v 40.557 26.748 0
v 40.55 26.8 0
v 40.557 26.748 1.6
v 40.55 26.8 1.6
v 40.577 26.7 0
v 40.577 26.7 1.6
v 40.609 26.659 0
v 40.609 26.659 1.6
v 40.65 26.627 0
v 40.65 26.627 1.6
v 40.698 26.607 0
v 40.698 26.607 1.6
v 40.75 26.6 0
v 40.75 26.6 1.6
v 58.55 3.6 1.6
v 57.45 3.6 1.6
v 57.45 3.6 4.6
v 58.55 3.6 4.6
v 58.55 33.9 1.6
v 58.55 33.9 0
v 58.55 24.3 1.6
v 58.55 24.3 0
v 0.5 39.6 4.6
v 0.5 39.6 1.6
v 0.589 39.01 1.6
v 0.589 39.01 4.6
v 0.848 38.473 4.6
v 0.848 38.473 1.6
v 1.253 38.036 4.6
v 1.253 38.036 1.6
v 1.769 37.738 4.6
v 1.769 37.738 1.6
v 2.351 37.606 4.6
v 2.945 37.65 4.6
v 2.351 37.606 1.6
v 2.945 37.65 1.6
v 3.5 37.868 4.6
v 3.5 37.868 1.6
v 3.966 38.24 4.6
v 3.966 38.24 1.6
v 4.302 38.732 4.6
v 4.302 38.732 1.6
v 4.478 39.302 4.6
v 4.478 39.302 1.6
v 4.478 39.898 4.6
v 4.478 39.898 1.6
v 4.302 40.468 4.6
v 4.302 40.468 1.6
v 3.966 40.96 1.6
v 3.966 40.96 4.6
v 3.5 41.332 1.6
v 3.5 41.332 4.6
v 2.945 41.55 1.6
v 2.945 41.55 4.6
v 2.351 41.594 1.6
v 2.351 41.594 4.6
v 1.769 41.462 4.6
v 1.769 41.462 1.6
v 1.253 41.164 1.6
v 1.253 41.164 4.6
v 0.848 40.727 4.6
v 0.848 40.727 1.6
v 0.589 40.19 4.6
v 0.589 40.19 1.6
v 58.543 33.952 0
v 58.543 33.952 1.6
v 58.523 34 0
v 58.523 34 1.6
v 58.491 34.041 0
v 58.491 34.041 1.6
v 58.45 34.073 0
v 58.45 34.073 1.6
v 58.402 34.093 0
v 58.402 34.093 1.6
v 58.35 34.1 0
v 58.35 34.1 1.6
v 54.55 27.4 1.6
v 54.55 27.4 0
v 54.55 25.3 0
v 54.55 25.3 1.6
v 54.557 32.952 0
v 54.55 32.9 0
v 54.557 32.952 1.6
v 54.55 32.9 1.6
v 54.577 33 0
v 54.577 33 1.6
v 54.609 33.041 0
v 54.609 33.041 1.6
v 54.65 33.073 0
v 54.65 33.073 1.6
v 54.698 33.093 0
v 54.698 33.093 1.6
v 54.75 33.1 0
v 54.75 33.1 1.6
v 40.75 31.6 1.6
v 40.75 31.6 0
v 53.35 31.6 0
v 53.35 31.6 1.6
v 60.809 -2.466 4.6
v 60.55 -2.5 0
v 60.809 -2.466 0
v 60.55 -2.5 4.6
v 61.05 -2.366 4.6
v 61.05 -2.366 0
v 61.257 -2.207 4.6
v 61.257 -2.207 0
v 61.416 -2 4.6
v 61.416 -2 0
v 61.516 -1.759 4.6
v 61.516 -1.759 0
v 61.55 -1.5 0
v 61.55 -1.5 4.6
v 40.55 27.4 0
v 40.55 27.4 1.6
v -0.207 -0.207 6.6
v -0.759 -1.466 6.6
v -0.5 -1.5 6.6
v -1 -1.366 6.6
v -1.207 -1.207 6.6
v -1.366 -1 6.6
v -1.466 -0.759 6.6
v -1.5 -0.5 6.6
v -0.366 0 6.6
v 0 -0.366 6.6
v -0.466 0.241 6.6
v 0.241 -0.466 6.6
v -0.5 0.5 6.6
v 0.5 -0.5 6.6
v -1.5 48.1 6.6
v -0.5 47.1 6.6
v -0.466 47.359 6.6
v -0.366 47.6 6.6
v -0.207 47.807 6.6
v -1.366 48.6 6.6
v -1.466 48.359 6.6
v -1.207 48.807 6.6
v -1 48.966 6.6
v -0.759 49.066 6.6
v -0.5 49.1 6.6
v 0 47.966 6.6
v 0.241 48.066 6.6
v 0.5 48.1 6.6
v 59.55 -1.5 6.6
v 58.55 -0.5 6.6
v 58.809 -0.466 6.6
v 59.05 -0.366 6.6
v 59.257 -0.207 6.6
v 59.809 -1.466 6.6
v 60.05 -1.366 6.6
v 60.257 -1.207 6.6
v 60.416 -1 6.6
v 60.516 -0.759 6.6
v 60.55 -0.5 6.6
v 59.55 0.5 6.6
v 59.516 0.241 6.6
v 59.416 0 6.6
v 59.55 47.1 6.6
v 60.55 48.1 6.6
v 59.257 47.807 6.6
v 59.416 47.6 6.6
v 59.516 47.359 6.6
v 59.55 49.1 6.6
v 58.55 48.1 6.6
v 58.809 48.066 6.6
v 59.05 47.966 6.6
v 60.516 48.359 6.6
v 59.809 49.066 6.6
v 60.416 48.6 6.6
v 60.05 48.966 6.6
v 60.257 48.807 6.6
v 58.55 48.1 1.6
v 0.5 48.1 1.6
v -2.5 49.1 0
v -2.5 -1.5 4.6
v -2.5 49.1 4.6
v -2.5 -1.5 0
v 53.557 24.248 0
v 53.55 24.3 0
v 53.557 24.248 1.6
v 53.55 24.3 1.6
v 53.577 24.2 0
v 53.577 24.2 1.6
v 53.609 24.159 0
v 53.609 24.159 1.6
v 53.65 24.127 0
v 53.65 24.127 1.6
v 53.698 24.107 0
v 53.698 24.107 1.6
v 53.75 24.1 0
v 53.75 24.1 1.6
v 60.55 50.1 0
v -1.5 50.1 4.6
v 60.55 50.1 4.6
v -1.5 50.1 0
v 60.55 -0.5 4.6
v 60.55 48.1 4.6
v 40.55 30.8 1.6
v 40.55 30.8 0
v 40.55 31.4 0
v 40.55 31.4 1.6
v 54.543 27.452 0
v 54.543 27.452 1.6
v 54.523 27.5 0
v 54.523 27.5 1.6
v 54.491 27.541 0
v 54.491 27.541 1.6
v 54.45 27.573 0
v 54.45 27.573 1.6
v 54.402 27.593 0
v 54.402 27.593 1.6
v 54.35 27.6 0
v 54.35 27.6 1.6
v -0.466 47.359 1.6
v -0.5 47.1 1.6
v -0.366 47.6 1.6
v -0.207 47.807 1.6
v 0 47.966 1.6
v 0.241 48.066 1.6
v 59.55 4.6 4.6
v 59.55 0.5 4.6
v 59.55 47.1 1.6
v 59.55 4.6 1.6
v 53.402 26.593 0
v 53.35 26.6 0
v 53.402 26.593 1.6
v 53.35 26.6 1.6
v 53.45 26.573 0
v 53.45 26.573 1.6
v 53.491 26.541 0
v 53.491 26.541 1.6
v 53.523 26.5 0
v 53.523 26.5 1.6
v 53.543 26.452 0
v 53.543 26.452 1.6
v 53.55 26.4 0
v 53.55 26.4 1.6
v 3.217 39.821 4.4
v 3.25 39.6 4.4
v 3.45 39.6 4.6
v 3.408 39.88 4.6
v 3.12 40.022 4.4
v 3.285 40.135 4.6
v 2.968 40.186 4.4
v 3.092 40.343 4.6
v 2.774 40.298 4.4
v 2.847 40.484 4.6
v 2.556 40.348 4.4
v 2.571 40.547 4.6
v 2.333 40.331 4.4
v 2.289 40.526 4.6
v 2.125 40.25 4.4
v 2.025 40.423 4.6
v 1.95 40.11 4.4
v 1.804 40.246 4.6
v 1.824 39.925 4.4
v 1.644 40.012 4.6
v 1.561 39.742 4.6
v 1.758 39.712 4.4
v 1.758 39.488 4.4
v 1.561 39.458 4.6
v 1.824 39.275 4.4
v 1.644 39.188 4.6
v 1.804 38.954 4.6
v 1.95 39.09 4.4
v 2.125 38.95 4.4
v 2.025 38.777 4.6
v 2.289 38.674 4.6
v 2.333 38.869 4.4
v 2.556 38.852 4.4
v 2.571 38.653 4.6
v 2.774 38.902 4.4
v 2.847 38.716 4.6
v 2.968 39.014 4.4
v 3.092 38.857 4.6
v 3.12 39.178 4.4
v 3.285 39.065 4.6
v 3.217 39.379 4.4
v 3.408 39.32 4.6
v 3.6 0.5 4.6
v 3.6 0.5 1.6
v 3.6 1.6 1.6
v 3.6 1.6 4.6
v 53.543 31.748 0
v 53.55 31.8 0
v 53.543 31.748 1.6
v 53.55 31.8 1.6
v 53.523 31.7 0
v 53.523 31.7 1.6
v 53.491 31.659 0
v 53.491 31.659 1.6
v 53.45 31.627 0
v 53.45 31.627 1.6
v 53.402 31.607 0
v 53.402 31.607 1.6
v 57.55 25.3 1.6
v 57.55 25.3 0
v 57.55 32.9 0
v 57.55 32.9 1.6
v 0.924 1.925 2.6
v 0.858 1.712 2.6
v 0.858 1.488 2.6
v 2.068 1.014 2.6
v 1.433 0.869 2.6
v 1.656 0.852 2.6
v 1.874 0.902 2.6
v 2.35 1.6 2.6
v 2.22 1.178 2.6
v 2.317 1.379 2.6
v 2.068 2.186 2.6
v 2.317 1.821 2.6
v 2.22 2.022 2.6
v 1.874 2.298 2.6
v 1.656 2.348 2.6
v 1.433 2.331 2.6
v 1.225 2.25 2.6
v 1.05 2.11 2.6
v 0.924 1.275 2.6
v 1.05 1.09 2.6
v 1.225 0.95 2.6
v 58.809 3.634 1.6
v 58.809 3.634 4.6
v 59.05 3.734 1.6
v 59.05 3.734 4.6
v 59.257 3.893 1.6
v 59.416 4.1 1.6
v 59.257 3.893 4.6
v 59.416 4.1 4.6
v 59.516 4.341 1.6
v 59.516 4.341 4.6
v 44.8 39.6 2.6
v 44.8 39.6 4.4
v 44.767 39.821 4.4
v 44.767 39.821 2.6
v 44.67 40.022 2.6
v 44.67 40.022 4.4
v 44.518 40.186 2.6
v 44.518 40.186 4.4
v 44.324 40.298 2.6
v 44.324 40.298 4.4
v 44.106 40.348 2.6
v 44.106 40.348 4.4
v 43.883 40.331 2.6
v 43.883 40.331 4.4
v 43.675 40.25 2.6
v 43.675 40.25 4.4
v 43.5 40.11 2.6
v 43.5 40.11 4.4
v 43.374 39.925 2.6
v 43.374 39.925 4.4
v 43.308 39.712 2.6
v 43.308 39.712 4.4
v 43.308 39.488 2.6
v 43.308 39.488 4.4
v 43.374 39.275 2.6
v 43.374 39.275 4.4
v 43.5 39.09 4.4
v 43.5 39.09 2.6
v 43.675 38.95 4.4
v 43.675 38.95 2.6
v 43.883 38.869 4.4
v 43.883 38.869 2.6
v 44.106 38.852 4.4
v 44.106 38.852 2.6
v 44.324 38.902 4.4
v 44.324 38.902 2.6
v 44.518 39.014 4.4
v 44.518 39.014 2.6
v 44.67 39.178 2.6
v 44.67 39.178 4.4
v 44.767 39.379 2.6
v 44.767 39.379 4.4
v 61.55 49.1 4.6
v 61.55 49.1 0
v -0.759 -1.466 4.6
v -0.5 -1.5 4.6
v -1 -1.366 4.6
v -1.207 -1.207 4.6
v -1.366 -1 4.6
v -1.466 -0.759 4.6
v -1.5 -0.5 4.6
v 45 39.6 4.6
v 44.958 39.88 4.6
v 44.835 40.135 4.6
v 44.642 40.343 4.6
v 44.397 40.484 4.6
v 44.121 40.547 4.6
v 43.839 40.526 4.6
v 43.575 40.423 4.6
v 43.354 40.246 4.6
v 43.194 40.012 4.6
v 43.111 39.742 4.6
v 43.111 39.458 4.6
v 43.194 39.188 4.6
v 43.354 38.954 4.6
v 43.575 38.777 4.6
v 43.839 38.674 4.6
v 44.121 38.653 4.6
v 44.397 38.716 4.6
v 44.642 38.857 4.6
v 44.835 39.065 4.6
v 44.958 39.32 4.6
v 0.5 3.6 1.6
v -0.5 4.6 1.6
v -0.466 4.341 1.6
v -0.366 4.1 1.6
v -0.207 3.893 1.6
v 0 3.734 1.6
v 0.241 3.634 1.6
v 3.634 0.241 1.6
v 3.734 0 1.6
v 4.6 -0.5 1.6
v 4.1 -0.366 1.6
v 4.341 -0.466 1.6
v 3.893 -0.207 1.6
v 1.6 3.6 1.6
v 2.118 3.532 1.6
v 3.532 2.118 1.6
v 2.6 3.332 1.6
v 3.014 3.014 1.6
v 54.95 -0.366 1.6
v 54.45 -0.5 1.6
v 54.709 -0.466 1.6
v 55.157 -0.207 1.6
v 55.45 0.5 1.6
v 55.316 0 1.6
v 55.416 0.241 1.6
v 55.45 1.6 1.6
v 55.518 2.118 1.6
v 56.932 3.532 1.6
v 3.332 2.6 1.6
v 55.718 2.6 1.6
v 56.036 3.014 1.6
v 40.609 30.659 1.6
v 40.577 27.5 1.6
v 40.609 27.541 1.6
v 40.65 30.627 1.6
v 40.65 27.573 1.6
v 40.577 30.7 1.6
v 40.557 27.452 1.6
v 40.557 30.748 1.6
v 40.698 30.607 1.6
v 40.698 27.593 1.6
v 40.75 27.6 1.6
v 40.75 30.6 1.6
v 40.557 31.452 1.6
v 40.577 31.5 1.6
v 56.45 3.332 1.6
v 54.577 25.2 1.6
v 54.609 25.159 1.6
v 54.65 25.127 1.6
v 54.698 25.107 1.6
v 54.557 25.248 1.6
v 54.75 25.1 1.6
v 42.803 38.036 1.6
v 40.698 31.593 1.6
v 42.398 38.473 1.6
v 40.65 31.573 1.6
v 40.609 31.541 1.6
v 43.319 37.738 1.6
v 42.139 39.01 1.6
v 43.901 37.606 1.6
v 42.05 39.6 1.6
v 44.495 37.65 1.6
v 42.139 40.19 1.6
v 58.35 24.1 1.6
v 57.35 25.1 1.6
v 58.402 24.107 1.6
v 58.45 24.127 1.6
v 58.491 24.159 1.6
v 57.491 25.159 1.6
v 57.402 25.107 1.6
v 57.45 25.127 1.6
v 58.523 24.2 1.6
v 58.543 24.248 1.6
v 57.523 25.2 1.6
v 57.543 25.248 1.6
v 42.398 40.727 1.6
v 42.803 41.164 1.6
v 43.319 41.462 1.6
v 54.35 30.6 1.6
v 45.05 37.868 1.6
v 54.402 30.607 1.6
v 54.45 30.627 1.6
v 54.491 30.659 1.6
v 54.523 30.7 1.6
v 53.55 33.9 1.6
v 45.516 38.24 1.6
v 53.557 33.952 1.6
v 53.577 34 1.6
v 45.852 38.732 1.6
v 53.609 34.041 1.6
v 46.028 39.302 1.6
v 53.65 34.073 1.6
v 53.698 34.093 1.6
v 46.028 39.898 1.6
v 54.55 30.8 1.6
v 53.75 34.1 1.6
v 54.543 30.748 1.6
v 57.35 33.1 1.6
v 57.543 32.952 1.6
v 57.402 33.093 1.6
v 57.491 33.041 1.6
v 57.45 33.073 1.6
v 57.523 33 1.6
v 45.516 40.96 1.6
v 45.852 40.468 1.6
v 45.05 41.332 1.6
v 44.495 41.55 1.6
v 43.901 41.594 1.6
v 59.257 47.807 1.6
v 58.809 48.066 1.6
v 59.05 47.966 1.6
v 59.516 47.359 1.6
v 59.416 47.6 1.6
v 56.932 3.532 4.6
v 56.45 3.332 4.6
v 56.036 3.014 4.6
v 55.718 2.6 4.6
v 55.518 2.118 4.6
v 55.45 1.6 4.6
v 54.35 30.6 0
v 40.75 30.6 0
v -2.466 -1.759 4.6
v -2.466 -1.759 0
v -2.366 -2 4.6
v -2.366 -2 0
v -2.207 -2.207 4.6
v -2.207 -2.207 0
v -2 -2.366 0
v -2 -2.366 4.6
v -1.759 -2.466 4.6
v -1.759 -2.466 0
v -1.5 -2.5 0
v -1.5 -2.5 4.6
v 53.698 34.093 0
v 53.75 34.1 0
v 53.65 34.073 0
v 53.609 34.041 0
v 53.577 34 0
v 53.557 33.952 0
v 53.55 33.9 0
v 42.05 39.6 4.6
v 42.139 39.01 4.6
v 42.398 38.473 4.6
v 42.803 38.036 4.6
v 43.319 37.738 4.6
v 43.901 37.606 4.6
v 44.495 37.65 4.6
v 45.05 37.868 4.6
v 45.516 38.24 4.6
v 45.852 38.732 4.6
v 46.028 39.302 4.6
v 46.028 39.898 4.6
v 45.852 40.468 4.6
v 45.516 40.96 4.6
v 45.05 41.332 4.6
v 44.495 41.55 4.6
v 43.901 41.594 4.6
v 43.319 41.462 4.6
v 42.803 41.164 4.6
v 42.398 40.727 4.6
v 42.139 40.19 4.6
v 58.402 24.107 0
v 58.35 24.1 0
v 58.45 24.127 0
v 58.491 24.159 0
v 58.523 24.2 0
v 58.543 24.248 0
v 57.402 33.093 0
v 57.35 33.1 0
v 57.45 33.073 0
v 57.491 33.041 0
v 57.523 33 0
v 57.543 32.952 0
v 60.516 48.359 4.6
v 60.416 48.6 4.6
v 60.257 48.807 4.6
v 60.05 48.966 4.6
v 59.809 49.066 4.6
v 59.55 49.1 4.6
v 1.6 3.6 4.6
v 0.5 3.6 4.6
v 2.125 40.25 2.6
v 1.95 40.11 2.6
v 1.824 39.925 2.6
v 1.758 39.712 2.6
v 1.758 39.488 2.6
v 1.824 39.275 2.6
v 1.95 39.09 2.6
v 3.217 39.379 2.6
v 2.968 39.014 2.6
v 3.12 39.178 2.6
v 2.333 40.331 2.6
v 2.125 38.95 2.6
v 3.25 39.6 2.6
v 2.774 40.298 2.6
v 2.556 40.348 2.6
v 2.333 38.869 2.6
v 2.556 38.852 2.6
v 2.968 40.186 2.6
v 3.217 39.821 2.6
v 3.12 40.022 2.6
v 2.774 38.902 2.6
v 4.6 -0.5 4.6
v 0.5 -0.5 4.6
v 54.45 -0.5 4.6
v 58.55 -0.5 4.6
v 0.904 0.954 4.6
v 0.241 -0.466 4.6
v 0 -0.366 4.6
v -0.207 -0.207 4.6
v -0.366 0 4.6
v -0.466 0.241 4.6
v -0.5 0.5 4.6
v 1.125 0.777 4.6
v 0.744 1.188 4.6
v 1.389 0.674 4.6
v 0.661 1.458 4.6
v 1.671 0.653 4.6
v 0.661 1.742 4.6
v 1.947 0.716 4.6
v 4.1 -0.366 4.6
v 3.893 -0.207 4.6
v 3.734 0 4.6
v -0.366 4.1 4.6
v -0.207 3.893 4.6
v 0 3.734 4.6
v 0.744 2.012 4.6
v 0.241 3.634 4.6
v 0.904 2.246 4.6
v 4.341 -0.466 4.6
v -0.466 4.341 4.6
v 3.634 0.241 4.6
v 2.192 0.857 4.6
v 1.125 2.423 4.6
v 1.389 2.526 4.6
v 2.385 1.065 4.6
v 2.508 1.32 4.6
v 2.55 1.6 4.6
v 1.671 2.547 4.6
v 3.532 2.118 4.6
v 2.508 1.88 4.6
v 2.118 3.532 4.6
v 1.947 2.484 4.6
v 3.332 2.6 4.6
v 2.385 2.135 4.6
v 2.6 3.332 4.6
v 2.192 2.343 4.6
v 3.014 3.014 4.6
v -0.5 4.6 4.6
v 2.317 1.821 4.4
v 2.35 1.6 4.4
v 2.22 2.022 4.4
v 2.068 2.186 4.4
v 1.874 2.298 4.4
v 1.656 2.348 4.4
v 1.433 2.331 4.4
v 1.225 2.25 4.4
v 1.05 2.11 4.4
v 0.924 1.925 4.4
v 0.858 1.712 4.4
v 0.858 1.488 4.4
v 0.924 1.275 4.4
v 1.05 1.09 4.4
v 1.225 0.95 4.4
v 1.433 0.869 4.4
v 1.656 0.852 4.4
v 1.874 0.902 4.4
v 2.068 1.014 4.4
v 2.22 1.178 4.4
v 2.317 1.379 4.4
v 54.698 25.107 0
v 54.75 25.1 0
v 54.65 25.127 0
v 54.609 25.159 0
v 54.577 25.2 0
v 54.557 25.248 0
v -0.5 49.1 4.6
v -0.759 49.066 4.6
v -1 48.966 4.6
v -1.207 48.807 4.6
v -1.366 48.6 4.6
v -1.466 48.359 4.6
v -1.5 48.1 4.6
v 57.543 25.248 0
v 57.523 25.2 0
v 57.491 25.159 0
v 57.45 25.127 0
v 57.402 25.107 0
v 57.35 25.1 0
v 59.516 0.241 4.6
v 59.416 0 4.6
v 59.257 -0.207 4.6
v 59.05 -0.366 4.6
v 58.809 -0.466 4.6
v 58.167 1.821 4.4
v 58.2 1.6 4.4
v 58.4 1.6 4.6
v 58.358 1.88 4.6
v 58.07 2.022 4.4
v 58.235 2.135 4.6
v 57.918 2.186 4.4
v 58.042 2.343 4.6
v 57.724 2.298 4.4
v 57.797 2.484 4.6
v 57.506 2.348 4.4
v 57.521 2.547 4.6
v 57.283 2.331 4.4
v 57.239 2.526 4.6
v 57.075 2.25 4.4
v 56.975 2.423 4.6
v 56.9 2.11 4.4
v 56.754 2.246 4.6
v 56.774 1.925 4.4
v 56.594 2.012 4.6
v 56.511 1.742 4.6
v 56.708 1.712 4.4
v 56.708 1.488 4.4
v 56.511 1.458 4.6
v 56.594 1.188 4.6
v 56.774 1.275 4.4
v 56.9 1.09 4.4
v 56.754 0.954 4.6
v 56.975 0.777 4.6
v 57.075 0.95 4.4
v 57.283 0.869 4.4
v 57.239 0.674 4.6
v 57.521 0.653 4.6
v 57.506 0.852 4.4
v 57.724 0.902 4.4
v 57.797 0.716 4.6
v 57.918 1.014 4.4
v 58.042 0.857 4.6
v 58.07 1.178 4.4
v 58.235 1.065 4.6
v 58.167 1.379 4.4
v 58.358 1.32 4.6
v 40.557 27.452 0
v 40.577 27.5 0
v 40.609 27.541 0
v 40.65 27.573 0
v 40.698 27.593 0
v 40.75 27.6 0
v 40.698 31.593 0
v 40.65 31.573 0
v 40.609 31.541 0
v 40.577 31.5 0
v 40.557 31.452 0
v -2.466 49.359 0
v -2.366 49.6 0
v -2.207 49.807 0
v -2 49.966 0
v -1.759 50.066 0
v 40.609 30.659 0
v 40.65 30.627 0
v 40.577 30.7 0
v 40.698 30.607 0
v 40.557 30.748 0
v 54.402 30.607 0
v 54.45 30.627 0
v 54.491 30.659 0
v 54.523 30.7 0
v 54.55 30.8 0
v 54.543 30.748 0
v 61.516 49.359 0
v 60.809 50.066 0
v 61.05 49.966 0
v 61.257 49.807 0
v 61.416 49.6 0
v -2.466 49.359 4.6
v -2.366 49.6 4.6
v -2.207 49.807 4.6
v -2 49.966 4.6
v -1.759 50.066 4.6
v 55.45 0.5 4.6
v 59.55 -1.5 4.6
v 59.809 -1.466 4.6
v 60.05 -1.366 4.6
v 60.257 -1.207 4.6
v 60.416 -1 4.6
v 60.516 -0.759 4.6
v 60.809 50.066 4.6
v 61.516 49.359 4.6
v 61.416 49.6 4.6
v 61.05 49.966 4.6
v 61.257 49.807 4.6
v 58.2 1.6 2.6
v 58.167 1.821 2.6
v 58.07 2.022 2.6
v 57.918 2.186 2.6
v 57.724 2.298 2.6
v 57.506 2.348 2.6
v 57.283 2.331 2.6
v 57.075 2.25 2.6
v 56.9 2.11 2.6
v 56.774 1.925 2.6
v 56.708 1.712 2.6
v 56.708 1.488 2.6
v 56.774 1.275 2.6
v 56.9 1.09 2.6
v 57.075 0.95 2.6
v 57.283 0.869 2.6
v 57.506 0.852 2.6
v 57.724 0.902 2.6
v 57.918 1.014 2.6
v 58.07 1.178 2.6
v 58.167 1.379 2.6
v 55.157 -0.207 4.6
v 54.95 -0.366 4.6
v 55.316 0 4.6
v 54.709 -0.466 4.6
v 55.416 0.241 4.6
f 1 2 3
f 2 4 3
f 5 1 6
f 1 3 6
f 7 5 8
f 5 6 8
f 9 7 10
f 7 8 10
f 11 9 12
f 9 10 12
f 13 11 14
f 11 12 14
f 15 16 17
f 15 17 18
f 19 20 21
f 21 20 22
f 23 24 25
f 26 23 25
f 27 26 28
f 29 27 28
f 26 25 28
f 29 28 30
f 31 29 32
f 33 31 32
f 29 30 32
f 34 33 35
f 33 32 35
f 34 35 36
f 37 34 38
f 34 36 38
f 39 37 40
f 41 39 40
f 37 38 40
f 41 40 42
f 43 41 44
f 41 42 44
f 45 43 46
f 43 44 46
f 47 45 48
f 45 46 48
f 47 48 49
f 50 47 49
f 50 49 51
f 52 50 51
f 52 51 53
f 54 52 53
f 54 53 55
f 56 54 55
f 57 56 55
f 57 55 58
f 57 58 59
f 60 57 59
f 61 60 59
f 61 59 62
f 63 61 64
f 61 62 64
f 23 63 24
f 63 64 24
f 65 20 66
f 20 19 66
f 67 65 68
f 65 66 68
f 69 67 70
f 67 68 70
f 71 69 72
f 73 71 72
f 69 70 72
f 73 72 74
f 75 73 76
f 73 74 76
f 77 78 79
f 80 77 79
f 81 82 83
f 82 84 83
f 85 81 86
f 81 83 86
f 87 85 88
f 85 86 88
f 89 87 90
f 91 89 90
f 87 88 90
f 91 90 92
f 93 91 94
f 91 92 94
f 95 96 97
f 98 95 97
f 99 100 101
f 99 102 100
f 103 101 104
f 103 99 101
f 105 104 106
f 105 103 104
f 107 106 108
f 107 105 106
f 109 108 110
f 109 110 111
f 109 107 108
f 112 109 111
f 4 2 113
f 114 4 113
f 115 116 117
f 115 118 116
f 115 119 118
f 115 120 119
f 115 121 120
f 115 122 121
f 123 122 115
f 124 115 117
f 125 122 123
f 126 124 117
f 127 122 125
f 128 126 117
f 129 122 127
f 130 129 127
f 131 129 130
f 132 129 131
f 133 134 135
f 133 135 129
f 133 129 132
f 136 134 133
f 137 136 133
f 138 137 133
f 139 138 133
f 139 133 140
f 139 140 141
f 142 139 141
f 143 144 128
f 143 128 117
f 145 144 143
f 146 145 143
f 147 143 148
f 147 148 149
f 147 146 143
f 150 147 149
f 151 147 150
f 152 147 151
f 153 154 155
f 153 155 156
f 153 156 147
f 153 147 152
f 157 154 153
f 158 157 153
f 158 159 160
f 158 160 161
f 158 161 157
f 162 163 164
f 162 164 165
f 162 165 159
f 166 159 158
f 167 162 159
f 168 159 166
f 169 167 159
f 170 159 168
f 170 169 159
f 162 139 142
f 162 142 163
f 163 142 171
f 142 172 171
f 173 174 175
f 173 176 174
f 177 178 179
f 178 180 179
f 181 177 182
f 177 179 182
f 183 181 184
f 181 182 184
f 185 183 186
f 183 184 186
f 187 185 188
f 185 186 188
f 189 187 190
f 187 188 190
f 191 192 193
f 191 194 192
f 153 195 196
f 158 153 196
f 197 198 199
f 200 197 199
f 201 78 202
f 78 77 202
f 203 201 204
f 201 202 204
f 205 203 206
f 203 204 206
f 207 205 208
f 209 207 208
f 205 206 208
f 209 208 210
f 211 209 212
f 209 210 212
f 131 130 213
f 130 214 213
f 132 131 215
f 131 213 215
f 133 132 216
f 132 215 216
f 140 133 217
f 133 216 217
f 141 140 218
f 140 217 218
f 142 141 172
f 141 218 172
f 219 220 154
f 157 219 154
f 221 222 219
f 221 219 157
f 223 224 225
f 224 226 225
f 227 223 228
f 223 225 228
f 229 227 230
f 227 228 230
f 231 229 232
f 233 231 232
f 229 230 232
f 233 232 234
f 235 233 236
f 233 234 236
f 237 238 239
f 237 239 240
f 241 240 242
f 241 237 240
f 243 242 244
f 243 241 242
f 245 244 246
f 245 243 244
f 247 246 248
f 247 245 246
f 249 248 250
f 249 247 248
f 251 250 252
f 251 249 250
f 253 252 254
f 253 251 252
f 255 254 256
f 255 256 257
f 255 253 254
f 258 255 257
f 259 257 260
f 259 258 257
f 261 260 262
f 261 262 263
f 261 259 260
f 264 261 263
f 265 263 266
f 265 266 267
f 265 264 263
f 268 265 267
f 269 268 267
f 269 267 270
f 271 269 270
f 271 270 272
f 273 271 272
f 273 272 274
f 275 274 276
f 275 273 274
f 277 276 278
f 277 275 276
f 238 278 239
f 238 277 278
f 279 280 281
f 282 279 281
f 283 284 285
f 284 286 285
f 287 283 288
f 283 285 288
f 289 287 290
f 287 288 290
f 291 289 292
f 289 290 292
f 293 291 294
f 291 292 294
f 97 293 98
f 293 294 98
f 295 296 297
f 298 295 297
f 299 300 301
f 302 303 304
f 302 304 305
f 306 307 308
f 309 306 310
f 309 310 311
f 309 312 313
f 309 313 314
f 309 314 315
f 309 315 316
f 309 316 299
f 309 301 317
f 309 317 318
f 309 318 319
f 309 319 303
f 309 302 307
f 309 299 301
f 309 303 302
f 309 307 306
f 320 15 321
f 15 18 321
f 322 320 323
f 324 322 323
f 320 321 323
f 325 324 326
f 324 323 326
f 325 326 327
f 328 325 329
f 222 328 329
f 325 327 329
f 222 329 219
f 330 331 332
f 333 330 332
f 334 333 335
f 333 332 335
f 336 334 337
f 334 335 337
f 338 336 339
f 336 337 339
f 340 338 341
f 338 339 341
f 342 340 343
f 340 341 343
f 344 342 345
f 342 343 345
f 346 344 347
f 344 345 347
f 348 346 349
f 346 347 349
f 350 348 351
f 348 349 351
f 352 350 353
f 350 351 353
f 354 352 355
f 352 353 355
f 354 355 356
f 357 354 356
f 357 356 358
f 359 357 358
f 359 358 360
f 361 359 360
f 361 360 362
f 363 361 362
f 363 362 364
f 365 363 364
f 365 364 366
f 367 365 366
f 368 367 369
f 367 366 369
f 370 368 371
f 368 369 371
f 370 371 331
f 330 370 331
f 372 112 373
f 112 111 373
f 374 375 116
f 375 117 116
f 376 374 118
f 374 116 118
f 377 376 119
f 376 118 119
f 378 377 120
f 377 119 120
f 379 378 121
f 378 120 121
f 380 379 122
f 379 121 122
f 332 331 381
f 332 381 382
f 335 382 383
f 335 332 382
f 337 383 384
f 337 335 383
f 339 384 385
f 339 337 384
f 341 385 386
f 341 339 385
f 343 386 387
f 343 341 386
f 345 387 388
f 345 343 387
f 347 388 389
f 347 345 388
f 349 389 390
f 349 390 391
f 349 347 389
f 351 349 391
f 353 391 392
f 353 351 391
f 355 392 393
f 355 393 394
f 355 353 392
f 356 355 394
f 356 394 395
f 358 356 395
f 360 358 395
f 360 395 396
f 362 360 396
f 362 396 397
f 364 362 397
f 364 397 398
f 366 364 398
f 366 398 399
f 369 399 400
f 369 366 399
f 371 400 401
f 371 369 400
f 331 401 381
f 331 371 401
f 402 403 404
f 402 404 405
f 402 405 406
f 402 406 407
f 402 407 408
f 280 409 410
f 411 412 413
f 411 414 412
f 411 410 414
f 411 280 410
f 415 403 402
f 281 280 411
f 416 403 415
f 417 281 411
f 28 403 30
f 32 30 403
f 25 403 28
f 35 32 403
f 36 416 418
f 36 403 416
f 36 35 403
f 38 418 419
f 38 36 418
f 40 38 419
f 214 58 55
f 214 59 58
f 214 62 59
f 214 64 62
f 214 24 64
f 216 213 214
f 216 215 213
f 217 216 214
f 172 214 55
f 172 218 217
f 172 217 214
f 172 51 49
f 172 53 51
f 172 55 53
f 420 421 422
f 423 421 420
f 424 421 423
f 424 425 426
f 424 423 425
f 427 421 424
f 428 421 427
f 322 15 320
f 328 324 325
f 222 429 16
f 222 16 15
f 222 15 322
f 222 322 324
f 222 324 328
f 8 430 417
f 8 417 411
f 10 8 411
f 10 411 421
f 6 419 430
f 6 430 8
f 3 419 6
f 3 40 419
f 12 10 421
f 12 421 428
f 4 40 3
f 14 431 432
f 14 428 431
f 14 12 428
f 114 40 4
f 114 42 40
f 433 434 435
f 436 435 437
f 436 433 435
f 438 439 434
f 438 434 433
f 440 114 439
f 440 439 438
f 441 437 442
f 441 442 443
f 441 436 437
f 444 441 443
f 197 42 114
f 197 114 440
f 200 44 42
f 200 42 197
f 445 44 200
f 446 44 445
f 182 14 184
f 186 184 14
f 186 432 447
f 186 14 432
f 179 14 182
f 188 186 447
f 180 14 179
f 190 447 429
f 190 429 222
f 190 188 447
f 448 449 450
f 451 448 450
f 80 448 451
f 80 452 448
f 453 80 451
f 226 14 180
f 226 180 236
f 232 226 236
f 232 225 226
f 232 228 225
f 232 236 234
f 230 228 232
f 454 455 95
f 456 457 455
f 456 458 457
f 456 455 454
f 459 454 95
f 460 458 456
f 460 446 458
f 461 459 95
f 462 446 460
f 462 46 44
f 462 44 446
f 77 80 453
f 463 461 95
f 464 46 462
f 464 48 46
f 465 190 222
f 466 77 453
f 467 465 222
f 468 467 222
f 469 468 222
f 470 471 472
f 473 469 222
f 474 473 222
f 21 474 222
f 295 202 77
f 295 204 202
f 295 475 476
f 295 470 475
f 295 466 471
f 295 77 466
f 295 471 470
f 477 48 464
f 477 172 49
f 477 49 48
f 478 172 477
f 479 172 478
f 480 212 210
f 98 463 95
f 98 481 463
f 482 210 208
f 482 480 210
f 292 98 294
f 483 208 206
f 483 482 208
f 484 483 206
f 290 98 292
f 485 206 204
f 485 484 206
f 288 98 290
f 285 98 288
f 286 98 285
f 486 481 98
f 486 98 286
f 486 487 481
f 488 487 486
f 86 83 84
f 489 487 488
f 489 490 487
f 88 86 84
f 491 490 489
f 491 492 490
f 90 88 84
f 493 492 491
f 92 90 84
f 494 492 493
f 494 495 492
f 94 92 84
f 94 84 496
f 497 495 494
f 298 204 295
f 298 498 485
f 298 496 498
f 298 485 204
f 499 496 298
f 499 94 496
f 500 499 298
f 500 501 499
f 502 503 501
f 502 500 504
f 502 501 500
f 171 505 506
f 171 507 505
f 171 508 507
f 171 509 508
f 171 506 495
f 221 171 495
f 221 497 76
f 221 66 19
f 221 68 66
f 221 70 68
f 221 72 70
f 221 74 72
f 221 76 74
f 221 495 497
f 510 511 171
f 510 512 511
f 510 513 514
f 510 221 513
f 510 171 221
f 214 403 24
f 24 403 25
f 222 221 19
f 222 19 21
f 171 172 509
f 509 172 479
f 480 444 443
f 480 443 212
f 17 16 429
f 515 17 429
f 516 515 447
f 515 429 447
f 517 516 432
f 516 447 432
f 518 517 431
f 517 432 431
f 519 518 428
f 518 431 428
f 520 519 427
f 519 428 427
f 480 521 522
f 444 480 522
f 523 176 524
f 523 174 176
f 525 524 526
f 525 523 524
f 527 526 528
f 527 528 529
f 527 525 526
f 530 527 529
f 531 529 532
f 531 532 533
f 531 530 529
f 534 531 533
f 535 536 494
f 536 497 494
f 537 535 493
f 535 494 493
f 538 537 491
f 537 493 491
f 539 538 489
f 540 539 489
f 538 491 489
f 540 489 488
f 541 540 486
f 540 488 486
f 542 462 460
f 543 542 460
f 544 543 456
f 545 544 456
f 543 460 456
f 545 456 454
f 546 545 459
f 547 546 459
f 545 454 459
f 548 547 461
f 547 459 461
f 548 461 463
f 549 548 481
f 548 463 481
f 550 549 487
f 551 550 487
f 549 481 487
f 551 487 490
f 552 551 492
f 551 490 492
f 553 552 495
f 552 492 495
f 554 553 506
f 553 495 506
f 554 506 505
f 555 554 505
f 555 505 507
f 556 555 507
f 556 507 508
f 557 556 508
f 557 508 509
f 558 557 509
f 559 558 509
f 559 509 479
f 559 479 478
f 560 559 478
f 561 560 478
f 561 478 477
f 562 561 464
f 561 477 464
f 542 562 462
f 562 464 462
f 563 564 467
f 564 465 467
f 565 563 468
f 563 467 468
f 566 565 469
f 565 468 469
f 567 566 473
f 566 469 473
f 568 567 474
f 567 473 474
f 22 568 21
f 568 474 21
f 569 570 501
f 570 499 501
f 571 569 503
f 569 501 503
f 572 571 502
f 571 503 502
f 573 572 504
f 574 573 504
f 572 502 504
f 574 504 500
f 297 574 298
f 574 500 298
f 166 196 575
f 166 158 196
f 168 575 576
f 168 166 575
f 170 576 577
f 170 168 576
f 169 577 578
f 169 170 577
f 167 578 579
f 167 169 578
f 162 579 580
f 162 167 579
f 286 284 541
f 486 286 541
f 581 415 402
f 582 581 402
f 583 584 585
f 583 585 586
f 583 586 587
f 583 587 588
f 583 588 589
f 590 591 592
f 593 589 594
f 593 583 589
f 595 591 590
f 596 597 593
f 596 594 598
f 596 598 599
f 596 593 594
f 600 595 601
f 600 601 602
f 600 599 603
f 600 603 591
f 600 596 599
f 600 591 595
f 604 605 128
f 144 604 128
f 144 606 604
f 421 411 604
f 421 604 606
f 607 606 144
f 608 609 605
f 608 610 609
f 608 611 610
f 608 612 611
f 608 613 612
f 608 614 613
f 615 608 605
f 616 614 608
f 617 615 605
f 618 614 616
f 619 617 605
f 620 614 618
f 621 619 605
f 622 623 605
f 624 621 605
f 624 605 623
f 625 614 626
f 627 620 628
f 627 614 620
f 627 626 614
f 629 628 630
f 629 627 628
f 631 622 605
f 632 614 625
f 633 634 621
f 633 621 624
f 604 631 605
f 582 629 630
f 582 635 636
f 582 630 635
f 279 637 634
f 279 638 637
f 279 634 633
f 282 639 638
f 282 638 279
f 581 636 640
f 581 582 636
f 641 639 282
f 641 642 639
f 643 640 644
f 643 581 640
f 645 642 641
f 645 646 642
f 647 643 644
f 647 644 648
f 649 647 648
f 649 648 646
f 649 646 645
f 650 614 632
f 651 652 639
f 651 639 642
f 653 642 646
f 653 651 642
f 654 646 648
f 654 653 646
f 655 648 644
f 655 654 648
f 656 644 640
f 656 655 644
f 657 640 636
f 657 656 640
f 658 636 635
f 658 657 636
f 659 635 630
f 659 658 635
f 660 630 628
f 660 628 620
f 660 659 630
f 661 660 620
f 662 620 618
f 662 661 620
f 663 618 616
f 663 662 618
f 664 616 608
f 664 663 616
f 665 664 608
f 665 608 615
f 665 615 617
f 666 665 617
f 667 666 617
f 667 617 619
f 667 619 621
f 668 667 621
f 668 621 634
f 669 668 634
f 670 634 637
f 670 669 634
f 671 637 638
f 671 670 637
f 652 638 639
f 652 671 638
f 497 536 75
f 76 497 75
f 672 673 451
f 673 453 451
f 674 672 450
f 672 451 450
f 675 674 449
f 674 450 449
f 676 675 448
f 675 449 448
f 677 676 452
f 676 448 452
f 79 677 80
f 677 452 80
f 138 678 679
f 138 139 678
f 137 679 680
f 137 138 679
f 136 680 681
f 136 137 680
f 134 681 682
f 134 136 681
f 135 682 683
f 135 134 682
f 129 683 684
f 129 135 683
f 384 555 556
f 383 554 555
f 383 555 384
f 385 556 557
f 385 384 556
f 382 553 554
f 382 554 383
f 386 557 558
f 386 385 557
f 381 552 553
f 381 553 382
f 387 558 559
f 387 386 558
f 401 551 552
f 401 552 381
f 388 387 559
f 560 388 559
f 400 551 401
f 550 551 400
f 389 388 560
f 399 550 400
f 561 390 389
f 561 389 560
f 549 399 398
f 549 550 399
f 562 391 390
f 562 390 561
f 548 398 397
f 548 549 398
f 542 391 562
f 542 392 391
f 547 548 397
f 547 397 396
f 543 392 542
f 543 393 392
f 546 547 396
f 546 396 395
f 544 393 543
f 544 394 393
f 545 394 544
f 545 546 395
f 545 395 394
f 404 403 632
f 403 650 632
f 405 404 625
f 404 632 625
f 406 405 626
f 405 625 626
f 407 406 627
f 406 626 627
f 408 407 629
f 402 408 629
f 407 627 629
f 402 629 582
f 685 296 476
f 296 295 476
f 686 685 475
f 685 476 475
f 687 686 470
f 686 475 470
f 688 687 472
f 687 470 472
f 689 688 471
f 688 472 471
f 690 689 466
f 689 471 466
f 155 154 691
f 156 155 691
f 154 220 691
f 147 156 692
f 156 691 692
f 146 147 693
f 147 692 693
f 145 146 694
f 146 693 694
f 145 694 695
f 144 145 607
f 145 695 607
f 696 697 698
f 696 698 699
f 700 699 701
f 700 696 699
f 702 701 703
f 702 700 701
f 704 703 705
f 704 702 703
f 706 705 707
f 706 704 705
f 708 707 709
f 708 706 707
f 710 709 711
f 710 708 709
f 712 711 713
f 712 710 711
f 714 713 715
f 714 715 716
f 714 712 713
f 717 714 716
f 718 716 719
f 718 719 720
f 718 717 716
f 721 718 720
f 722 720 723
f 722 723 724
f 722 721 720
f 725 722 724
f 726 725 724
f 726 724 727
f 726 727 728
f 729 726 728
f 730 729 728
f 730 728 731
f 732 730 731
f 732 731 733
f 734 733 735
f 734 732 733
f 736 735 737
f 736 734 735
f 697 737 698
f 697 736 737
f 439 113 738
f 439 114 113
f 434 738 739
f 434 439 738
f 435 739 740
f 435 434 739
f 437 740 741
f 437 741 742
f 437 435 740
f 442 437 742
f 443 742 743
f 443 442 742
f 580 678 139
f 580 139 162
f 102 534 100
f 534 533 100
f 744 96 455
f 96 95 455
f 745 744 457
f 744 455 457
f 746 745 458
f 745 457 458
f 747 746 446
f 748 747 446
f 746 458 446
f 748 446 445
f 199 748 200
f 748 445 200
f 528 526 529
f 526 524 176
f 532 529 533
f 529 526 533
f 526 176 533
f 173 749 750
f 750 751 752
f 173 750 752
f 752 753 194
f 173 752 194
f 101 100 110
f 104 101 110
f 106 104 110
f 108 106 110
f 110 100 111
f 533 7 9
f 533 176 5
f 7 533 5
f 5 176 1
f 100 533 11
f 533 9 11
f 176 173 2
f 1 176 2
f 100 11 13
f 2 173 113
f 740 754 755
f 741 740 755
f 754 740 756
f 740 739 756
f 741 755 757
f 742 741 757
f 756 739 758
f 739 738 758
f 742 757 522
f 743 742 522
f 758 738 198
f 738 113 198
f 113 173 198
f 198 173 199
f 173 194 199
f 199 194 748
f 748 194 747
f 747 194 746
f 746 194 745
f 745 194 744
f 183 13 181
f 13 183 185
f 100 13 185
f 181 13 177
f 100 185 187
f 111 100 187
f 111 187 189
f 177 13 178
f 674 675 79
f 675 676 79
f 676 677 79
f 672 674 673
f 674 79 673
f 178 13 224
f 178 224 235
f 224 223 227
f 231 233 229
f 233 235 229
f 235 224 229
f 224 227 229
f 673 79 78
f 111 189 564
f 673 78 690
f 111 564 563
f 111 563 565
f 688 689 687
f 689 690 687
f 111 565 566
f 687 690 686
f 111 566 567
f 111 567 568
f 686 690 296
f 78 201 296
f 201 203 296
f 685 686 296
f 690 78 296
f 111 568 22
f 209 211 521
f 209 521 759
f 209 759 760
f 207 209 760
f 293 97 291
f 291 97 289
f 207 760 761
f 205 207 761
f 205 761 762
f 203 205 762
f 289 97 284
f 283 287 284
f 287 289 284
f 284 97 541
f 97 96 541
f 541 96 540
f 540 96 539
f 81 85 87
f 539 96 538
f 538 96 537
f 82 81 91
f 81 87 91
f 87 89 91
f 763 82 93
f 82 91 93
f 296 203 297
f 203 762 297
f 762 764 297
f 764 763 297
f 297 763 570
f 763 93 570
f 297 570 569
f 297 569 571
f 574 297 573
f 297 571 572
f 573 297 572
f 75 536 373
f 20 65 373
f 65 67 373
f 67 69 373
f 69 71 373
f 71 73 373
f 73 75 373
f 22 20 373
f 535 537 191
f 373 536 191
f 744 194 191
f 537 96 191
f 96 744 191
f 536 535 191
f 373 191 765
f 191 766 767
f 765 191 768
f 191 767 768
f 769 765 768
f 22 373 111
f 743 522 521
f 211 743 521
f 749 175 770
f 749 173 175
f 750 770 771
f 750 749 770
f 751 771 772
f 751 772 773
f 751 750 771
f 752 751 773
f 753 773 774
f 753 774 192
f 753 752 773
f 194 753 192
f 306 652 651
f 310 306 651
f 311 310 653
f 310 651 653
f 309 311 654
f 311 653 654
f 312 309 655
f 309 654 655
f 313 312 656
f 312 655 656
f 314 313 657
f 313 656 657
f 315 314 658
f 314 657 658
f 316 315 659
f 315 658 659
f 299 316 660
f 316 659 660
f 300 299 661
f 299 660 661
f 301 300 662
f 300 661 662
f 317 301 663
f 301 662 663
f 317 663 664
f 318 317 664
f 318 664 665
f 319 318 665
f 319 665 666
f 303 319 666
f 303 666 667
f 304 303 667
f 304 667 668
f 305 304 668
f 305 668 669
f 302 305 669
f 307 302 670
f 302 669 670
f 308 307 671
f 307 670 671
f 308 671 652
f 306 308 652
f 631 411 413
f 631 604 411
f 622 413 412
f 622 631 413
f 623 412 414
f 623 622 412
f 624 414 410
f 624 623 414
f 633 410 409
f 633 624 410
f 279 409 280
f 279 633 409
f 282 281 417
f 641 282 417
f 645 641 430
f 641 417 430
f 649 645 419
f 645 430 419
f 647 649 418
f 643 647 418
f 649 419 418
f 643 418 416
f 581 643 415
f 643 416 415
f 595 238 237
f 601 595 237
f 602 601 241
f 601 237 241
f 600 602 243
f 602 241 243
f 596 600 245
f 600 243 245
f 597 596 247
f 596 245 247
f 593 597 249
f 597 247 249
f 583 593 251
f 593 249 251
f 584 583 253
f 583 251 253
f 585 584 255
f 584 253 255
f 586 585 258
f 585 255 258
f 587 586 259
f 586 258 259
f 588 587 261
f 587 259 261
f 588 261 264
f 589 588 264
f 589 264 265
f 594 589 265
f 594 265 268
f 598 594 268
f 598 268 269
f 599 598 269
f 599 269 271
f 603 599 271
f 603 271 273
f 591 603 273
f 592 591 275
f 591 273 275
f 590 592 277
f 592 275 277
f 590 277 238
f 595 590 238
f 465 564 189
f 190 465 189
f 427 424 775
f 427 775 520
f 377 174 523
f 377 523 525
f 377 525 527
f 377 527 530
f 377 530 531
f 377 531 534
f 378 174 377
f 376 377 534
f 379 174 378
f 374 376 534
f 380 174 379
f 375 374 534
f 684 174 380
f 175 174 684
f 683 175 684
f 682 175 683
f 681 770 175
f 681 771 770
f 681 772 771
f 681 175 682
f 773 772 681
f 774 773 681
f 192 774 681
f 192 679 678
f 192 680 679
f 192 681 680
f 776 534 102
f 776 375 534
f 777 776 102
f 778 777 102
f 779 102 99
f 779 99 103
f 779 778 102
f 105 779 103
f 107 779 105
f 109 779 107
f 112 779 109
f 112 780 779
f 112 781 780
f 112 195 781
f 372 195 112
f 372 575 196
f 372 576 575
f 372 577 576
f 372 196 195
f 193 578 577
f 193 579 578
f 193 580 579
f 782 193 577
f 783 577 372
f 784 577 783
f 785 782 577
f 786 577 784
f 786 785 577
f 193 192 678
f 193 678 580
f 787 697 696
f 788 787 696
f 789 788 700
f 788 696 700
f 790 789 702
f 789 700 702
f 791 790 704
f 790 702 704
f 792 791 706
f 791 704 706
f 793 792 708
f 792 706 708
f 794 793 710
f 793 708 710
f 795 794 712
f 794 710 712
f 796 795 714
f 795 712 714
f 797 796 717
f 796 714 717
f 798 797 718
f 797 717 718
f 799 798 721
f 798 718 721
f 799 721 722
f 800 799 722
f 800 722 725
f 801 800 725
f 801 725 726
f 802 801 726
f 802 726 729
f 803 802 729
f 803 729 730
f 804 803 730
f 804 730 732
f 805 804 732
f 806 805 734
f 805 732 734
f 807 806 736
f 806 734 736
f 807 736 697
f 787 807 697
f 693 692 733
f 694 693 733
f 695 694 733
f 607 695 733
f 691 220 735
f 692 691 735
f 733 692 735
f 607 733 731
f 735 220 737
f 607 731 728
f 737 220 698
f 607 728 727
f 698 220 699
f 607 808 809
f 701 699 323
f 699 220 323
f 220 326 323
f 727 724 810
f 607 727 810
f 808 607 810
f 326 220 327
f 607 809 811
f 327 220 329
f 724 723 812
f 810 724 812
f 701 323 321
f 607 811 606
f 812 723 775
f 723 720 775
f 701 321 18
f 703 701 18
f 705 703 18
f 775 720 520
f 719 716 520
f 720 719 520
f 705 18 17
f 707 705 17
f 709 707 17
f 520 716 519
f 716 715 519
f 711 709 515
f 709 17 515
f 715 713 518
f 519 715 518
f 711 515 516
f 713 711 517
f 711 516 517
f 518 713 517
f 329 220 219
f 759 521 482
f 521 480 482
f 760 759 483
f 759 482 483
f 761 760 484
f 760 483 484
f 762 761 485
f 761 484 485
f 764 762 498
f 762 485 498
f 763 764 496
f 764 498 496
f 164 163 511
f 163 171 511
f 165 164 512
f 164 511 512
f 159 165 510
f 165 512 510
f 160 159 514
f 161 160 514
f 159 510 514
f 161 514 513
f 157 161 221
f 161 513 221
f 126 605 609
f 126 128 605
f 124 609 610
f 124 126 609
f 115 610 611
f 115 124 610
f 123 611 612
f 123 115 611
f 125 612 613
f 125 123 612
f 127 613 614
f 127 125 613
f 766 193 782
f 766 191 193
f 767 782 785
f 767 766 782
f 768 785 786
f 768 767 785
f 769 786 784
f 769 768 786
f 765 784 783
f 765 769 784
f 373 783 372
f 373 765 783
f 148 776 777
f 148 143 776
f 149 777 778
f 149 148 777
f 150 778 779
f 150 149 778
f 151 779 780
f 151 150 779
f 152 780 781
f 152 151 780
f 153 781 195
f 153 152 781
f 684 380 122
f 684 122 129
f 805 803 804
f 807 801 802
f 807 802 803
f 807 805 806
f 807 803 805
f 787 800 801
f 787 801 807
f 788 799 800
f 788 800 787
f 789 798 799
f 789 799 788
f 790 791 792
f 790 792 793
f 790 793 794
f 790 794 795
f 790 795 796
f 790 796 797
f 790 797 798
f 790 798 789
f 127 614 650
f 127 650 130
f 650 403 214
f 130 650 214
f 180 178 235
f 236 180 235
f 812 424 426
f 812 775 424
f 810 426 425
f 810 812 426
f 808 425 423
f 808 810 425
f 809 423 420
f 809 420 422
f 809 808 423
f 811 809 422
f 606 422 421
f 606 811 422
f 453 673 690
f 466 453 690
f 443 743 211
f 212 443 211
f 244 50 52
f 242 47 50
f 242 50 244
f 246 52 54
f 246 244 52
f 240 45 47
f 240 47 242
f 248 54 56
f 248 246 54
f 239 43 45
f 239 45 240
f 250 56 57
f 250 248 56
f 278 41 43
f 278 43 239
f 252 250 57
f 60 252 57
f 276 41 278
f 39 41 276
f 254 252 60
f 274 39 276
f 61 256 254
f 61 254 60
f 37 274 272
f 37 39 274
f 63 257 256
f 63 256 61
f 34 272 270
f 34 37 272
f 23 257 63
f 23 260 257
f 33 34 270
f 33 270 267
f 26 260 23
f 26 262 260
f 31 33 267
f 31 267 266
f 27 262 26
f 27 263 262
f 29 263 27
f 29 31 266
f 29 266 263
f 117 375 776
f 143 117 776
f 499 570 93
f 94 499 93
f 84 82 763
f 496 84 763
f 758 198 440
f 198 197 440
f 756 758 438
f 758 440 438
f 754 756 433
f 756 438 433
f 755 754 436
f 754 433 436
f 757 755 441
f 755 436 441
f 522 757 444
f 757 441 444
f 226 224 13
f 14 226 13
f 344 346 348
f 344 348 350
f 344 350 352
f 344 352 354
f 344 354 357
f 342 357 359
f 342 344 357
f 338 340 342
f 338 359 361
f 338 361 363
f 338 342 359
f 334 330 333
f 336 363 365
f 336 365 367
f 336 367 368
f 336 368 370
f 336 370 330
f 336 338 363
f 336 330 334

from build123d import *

# Parameters (mm, degrees)
SKETCH1_W           = 64.05
SKETCH1_H           = 52.6
BOSS_EXTRUDE1_DEPTH = 1.6
SKETCH2_W           = 64.05
SKETCH2_H           = 52.6
SKETCH2_W_2         = 60.05
SKETCH2_H_2         = 48.6
BOSS_EXTRUDE2_DEPTH = 3
SKETCH6_W           = 62.05
SKETCH6_H           = 50.6
SKETCH6_W_2         = 60.05
SKETCH6_H_2         = 48.6
BOSS_EXTRUDE6_DEPTH = 2
CUT_EXTRUDE2_DEPTH  = 2
FILLET2_R           = 0.2
SKETCH11_R          = 2
BOSS_EXTRUDE7_DEPTH = 3
SKETCH12_R          = 0.75
CUT_EXTRUDE3_DEPTH  = 2
FILLET4_R           = 1
BOSS_EXTRUDE8_DEPTH = 3
FILLET5_R           = 1
CHAMFER2_SIZE       = 0.2


with BuildPart() as part:
    # Sketch1 → Boss-Extrude1 (new body)
    with BuildSketch(Plane.XY):
        with Locations((29.525, 23.8)):
            Rectangle(SKETCH1_W, SKETCH1_H)
    extrude(amount=BOSS_EXTRUDE1_DEPTH)

    # Sketch2 → Boss-Extrude2 (add)
    with BuildSketch(Plane.XY.offset(1.6)):
        with Locations((29.525, 23.8)):
            Rectangle(SKETCH2_W, SKETCH2_H)
        with Locations((29.525, 23.8)):
            Rectangle(SKETCH2_W_2, SKETCH2_H_2, mode=Mode.SUBTRACT)
    extrude(amount=BOSS_EXTRUDE2_DEPTH)

    # Sketch6 → Boss-Extrude6 (add)
    with BuildSketch(Plane.XY.offset(4.6)):
        with Locations((29.525, 23.8)):
            Rectangle(SKETCH6_W, SKETCH6_H)
        with Locations((29.525, 23.8)):
            Rectangle(SKETCH6_W_2, SKETCH6_H_2, mode=Mode.SUBTRACT)
    extrude(amount=BOSS_EXTRUDE6_DEPTH)

    # Sketch9 → Cut-Extrude2 (cut)
    with BuildSketch(Plane(origin=(0, 0, 0), x_dir=(-1, 0, 0), z_dir=(0, 0, -1))):
        Polygon((-40.55, 27.6), (-54.55, 27.6), (-54.55, 25.1), (-57.55, 25.1), (-57.55, 33.1), (-54.55, 33.1), (-54.55, 30.6), (-40.55, 30.6), (-40.55, 31.6), (-53.55, 31.6), (-53.55, 34.1), (-58.55, 34.1), (-58.55, 24.1), (-53.55, 24.1), (-53.55, 26.6), (-40.55, 26.6), align=None)
    extrude(amount=-CUT_EXTRUDE2_DEPTH, mode=Mode.SUBTRACT)

    # Fillet2
    fillet2_edges = [part.edges().sort_by_distance(p)[0] for p in [
        (40.55, 27.6, 0.8),
        (40.55, 26.6, 0.8),
        (53.55, 26.6, 0.8),
        (53.55, 24.1, 0.8),
        (58.55, 24.1, 0.8),
        (58.55, 34.1, 0.8),
        (53.55, 34.1, 0.8),
        (53.55, 31.6, 0.8),
        (40.55, 31.6, 0.8),
        (40.55, 30.6, 0.8),
        (54.55, 30.6, 0.8),
        (54.55, 33.1, 0.8),
        (57.55, 33.1, 0.8),
        (57.55, 25.1, 0.8),
        (54.55, 25.1, 0.8),
        (54.55, 27.6, 0.8),
    ]]
    fillet(fillet2_edges, radius=FILLET2_R)

    # Sketch11 → Boss-Extrude7 (add)
    with BuildSketch(Plane.XY.offset(1.6)):
        with Locations(Location((1.6, 1.6, 0), (0, 0, 180))):
            Circle(SKETCH11_R)
        with Locations(Location((57.45, 1.6, 0), (0, 0, 180))):
            Circle(SKETCH11_R)
        with Locations(Location((44.05, 39.6, 0), (0, 0, 180))):
            Circle(SKETCH11_R)
        with Locations(Location((2.5, 39.6, 0), (0, 0, 180))):
            Circle(SKETCH11_R)
    extrude(amount=BOSS_EXTRUDE7_DEPTH)

    # Sketch12 → Cut-Extrude3 (cut)
    with BuildSketch(Plane.XY.offset(4.6)):
        with Locations((2.5, 39.6)):
            Circle(SKETCH12_R)
        with Locations((1.6, 1.6)):
            Circle(SKETCH12_R)
        with Locations((57.45, 1.6)):
            Circle(SKETCH12_R)
        with Locations((44.05, 39.6)):
            Circle(SKETCH12_R)
    extrude(amount=-CUT_EXTRUDE3_DEPTH, mode=Mode.SUBTRACT)

    # Fillet4
    fillet4_edges = [part.edges().sort_by_distance(p)[0] for p in [
        (59.55, 48.1, 4.1),
        (-0.5, 48.1, 4.1),
        (-1.5, -1.5, 5.6),
        (60.55, -1.5, 5.6),
        (60.55, 49.1, 5.6),
        (-1.5, 49.1, 5.6),
        (-2.5, 50.1, 2.3),
        (61.55, 50.1, 2.3),
        (61.55, -2.5, 2.3),
        (-2.5, -2.5, 2.3),
    ]]
    fillet(fillet4_edges, radius=FILLET4_R)

    # Sketch13 → Boss-Extrude8 (add)
    with BuildSketch(Plane.XY.offset(1.6)):
        with BuildLine():
            Line((1.6, 3.6), (-0.5, 3.6))
            Line((-0.5, 3.6), (-0.5, -0.5))
            Line((-0.5, -0.5), (3.6, -0.5))
            Line((3.6, -0.5), (3.6, 1.6))
            ThreePointArc((3.6, 1.6), (0.185786438, 0.185786438), (1.6, 3.6))
        make_face()
    boss_extrude8 = extrude(amount=BOSS_EXTRUDE8_DEPTH)

    # Mirror1: Boss-Extrude8 across plane
    add(boss_extrude8.mirror(Plane(origin=(29.525, 0, 0), x_dir=(0, 0, 1), z_dir=(1, 0, 0))))

    # Fillet5
    fillet5_edges = [part.edges().sort_by_distance(p)[0] for p in [
        (-0.5, -0.5, 5.6),
        (59.55, -0.5, 5.6),
        (-0.5, 3.6, 3.1),
        (3.6, -0.5, 3.1),
        (59.55, 3.6, 3.1),
        (55.45, -0.5, 3.1),
    ]]
    fillet(fillet5_edges, radius=FILLET5_R)

    # Chamfer2
    chamfer2_edges = [part.edges().sort_by_distance(p)[0] for p in [
        (1.75, 39.6, 4.6),
        (0.85, 1.6, 4.6),
        (56.7, 1.6, 4.6),
        (43.3, 39.6, 4.6),
    ]]
    chamfer(chamfer2_edges, length=CHAMFER2_SIZE)


solid = part.part
